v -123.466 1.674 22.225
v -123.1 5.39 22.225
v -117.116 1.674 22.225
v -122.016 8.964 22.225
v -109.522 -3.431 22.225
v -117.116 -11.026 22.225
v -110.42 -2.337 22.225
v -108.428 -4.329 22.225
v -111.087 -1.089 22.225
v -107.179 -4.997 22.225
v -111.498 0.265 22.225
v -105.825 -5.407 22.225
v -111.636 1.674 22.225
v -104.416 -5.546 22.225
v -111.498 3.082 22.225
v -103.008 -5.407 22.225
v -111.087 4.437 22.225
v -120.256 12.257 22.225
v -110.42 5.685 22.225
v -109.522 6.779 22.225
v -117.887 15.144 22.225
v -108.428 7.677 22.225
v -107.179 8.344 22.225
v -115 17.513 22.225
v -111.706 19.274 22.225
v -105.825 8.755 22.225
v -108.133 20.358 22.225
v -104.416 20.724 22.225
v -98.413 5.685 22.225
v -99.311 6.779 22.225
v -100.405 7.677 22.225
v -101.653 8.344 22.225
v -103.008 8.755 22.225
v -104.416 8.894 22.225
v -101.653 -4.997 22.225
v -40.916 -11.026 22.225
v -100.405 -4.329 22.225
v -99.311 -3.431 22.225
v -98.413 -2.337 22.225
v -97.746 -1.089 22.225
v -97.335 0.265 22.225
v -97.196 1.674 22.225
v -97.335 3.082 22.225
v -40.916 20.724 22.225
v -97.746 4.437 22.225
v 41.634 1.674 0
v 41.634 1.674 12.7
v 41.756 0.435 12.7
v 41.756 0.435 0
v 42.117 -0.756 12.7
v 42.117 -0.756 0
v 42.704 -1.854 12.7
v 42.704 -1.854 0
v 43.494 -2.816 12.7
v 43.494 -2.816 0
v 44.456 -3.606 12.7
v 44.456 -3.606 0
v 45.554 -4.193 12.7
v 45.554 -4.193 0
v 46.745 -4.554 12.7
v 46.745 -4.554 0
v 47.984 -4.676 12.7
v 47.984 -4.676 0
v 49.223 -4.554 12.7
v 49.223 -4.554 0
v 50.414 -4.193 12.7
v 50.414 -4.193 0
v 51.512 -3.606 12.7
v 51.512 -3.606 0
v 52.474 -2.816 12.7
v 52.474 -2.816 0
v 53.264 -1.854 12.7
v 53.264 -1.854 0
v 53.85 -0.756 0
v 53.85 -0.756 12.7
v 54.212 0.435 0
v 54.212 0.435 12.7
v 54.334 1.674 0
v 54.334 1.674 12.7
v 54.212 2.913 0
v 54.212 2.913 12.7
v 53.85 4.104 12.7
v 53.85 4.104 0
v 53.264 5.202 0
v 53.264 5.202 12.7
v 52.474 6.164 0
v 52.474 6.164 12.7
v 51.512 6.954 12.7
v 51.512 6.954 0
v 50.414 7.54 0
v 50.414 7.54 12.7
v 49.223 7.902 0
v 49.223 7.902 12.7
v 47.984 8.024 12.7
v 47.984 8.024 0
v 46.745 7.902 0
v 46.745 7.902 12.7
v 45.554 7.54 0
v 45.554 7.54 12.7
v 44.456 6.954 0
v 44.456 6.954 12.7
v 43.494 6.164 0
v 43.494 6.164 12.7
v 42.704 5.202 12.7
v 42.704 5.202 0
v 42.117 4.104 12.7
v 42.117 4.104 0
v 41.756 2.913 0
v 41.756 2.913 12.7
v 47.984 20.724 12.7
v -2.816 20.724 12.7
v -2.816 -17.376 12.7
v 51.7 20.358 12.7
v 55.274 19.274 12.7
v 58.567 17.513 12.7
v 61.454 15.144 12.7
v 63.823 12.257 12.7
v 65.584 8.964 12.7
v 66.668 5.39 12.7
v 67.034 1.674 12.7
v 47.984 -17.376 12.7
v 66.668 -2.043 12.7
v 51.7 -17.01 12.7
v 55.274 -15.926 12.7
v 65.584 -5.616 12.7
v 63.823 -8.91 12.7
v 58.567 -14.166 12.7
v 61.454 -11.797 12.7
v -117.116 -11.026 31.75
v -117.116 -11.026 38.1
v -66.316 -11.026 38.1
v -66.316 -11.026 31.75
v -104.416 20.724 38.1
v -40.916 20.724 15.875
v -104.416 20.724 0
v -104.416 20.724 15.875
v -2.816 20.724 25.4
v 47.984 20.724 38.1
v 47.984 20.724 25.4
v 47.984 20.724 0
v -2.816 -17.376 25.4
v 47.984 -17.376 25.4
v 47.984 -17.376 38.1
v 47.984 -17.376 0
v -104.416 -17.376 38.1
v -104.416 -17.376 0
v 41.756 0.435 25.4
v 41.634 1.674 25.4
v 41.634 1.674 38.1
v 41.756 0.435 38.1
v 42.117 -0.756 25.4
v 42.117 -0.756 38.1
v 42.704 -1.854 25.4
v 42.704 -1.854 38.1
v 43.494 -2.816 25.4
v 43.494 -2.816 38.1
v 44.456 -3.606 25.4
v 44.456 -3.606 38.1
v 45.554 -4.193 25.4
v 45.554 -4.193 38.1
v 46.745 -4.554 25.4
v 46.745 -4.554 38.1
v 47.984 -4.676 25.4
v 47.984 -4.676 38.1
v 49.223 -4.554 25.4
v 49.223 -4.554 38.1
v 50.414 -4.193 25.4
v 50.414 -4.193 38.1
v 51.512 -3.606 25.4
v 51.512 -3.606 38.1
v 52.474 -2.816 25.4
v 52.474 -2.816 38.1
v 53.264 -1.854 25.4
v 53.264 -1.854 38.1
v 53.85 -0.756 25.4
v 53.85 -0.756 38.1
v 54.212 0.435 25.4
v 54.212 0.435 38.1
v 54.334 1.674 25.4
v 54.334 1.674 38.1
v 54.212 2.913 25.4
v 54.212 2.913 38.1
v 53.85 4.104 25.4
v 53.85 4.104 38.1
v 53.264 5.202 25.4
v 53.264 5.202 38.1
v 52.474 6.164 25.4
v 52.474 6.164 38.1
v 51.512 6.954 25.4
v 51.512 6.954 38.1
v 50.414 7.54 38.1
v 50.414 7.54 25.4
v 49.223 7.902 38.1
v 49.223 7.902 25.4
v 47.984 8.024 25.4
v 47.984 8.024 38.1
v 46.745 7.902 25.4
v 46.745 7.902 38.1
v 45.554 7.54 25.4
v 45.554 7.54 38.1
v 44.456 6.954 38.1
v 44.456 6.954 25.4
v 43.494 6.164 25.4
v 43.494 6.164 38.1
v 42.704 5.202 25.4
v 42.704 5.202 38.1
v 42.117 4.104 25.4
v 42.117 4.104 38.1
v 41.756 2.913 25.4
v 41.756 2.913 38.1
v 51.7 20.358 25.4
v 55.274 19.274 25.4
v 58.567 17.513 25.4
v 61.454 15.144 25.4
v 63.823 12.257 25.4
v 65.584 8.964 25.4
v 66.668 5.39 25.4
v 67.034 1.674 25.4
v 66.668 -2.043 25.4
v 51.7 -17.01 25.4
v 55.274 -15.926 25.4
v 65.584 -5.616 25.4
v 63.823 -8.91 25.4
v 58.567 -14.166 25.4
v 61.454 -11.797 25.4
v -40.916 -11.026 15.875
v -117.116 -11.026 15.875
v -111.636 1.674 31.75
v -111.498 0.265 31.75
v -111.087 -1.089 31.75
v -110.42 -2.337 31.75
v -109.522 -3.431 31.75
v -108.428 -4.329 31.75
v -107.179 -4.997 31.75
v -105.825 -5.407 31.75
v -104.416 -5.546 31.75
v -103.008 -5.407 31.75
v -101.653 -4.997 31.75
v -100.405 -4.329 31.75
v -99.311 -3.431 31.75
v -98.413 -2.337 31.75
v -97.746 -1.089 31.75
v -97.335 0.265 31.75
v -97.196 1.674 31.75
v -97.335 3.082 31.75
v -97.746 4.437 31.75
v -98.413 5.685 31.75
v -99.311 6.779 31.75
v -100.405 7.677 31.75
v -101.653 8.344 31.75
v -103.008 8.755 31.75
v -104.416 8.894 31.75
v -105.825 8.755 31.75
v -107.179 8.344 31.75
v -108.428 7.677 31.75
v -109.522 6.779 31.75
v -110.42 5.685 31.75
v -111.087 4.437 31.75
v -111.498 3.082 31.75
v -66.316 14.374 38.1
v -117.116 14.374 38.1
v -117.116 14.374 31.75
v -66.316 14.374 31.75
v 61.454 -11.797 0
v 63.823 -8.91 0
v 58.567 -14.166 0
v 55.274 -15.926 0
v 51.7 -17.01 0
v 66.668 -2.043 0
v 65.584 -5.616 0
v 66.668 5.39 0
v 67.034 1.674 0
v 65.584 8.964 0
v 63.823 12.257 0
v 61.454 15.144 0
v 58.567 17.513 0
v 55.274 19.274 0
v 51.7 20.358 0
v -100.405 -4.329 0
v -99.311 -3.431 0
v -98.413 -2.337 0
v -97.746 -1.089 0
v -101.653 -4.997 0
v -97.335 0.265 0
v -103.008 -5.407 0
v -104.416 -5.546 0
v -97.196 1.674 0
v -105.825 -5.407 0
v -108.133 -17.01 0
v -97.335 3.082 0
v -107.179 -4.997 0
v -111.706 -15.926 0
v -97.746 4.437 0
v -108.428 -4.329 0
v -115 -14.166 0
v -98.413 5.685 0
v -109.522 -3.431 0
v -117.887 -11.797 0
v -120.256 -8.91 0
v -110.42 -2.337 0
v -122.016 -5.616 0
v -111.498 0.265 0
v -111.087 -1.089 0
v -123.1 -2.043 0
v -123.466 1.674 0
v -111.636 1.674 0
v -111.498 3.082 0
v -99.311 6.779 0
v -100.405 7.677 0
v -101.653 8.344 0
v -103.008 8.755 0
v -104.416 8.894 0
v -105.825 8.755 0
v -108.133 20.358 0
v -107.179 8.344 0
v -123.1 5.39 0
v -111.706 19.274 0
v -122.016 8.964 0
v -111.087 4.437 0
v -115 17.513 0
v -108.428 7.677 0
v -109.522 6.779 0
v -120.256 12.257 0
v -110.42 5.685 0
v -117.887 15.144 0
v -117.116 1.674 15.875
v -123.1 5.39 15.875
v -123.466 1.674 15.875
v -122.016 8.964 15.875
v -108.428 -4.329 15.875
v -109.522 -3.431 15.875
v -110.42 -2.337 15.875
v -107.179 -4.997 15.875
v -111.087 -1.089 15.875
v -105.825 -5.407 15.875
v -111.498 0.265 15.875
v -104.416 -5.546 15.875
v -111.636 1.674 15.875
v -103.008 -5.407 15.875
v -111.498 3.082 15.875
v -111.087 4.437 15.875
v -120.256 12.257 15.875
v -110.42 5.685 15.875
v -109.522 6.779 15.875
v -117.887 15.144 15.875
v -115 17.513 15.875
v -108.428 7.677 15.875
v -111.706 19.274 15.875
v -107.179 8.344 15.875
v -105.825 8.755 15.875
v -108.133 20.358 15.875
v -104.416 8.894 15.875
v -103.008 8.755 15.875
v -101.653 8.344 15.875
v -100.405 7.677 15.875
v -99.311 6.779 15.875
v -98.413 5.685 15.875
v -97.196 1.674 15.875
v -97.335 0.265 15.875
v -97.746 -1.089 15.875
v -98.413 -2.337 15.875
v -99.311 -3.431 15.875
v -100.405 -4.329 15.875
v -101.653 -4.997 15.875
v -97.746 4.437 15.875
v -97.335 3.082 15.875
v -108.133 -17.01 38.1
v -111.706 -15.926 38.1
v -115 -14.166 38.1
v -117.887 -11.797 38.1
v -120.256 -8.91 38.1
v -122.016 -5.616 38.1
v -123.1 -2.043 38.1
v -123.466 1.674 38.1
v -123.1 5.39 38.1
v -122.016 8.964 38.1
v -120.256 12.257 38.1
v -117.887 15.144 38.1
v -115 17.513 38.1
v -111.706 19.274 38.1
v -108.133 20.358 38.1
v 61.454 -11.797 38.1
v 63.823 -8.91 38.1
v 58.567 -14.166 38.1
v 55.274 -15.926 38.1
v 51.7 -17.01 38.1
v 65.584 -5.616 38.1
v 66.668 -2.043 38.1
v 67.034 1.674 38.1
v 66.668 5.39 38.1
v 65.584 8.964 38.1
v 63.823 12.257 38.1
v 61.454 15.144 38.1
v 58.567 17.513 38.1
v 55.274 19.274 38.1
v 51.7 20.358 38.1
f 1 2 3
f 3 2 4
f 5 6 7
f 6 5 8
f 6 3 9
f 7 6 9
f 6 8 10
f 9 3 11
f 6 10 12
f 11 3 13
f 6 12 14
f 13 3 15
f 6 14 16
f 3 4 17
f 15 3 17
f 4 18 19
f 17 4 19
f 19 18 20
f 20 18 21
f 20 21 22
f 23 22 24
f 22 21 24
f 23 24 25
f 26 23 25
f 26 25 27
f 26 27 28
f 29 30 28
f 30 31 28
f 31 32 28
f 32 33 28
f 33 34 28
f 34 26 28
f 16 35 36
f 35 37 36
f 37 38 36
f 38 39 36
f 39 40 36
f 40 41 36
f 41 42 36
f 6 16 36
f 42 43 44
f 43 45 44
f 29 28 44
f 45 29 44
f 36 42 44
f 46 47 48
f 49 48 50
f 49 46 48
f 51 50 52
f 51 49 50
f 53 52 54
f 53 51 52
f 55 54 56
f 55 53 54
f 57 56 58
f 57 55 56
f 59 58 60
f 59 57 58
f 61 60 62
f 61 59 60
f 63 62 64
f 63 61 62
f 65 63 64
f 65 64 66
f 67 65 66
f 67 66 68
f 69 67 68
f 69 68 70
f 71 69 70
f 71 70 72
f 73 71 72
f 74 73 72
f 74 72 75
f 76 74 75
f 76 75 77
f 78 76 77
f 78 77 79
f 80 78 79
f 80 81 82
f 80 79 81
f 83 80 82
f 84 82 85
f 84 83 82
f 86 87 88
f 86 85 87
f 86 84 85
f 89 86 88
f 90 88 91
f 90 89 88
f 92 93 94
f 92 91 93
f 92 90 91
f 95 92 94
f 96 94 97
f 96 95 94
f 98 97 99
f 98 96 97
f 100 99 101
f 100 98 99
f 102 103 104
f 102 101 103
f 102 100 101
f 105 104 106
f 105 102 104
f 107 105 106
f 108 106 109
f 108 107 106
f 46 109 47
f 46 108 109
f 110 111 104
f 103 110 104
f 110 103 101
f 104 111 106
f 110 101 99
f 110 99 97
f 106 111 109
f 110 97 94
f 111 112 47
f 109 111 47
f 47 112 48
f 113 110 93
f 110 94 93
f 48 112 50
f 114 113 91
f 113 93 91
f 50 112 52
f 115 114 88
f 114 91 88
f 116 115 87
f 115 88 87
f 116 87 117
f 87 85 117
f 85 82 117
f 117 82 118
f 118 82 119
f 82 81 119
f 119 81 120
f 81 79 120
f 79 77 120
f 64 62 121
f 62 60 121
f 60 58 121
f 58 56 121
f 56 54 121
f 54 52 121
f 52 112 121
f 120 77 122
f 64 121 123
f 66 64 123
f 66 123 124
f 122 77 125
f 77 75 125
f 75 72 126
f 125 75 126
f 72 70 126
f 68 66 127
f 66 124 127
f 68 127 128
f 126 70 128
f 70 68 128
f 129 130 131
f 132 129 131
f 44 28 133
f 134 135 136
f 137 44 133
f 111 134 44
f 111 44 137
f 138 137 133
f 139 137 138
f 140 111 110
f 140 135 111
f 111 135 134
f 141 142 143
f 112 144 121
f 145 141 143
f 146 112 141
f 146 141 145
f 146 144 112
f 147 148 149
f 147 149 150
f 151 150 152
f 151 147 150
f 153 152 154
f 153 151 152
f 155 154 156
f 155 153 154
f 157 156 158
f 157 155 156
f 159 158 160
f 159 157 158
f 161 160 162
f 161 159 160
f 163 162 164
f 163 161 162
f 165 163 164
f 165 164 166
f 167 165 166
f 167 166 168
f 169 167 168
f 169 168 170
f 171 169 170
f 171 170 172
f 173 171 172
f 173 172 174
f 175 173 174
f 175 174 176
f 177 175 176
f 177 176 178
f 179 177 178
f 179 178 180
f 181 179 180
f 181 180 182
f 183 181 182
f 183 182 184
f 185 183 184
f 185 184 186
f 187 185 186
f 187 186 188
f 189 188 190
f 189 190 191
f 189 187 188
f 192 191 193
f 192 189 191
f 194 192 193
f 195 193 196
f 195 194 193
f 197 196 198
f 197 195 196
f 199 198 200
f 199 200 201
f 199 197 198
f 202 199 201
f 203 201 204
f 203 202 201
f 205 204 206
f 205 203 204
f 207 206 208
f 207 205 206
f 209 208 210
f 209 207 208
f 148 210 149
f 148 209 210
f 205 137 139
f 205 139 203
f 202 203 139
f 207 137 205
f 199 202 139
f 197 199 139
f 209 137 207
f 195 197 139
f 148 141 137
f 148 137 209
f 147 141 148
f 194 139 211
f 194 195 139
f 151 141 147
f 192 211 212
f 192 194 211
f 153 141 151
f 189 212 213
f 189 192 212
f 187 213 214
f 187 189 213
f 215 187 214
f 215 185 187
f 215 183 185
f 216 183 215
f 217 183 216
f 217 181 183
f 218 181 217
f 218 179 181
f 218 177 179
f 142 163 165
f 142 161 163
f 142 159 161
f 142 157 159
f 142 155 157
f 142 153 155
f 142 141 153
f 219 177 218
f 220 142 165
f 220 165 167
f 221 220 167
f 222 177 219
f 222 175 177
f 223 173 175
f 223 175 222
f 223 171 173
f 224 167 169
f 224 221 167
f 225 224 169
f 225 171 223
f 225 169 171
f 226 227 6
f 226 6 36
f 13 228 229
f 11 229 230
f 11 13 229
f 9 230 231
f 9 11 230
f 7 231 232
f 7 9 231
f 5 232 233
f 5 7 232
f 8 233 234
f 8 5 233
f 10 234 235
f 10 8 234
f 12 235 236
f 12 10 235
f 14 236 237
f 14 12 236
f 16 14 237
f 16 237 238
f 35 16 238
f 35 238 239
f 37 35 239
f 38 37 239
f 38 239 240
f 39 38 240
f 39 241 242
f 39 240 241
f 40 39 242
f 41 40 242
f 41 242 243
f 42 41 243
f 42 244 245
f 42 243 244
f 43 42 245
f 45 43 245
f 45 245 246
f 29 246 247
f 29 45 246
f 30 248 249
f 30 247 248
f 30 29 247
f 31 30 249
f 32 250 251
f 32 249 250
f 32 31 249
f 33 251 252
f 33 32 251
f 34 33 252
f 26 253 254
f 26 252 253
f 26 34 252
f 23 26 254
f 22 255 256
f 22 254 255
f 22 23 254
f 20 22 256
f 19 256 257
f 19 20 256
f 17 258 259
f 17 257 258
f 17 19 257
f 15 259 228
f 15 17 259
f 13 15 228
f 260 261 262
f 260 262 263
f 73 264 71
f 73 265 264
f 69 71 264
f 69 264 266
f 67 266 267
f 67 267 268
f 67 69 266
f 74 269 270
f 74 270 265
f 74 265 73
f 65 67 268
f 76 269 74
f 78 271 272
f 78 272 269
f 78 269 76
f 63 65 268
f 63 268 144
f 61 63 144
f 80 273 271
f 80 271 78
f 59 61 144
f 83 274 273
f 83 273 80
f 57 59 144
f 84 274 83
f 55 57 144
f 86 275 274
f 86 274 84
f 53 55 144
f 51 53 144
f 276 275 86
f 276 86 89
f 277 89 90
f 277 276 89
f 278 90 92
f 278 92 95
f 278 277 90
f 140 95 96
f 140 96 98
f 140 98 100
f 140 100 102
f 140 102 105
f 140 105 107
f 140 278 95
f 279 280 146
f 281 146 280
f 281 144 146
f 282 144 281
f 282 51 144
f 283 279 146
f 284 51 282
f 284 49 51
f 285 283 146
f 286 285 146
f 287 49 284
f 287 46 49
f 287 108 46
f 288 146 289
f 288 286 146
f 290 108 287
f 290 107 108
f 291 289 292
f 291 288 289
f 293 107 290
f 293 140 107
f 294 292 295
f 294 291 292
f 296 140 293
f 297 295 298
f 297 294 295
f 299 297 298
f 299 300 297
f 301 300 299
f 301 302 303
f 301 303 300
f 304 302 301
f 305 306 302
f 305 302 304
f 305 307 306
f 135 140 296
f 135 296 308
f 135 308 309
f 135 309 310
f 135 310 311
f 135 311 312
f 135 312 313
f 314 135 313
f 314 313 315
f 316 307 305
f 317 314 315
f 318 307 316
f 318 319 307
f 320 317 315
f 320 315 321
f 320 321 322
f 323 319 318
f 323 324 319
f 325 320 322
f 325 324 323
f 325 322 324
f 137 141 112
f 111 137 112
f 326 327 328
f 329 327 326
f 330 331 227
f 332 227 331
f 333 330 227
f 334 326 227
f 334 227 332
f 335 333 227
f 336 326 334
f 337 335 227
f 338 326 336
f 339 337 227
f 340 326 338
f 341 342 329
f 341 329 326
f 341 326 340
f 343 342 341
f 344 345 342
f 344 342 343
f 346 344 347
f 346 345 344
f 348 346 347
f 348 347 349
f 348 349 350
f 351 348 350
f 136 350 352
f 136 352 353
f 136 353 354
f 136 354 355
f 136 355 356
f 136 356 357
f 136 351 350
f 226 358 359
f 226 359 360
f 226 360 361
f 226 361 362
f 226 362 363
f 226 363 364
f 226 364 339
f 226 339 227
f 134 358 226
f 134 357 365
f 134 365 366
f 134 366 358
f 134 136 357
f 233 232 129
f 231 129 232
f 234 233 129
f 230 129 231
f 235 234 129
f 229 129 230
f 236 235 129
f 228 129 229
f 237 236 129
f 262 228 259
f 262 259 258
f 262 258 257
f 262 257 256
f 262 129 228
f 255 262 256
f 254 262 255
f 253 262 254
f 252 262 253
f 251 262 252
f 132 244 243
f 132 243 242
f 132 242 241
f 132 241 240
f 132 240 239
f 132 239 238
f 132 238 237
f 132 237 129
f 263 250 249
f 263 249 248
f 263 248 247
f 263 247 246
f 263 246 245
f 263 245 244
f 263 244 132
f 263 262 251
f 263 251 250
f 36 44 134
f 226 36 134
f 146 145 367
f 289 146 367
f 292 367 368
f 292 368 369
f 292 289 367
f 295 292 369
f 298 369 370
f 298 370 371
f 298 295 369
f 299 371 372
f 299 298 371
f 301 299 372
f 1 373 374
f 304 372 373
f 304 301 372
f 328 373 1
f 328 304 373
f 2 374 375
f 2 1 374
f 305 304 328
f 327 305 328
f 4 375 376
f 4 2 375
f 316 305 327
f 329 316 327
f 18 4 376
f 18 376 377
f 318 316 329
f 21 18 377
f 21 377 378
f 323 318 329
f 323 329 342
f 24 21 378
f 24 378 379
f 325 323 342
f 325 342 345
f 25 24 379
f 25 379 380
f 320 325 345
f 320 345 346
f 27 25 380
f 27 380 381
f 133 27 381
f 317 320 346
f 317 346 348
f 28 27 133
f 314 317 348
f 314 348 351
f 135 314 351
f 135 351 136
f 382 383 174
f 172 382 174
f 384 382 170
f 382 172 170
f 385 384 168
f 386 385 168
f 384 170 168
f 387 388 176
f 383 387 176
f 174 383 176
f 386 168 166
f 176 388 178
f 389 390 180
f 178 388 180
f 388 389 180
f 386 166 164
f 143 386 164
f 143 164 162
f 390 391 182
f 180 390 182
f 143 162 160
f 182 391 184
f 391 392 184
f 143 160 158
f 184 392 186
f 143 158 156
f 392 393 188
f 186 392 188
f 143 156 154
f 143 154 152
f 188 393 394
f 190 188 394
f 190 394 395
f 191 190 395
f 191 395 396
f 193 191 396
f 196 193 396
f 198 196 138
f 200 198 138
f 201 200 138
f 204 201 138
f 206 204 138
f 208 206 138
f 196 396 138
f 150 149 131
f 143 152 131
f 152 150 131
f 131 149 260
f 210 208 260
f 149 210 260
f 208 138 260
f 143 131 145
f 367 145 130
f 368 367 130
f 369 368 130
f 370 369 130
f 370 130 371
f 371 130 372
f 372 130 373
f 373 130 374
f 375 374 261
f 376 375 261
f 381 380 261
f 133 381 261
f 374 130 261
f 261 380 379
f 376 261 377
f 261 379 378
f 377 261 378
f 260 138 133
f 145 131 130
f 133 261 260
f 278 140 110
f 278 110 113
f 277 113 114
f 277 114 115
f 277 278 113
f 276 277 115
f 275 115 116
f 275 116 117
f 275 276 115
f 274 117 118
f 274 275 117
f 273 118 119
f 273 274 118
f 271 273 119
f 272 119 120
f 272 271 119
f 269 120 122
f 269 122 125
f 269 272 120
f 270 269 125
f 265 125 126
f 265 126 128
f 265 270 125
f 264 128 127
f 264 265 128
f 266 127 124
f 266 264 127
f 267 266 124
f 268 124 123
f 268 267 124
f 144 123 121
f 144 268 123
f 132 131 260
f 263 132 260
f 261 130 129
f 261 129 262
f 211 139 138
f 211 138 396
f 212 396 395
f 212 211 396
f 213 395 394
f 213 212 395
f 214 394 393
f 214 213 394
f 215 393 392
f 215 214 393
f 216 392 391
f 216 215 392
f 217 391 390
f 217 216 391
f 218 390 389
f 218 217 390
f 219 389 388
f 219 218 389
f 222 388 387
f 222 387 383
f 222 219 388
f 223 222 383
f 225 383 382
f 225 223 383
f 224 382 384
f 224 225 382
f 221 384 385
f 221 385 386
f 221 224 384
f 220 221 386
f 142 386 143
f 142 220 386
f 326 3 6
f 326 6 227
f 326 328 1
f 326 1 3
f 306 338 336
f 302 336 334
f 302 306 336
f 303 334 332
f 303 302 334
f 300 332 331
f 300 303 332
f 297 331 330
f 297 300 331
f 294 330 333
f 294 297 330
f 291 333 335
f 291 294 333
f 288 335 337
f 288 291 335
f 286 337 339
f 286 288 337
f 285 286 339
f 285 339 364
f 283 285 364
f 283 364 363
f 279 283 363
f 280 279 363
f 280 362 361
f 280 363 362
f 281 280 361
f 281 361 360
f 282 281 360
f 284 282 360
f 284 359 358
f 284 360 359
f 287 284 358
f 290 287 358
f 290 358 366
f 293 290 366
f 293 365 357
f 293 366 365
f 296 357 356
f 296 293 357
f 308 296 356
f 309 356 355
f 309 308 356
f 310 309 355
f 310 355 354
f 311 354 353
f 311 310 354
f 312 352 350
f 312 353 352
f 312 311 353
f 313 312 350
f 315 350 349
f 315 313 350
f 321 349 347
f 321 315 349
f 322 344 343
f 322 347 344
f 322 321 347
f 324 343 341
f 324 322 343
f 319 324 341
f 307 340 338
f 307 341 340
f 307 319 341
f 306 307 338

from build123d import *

# Parameters (mm, degrees)
SKETCH1_R               = 6.35
SKETCH1_R_2             = 7.220009846
BOSS_EXTRUDE1_DEPTH     = 38.1
SKETCH2_W               = 50.8
SKETCH2_H               = 25.4
CUT_EXTRUDE1_DEPTH      = 6.35
CUT_EXTRUDE2_DEPTH      = 131.862598214
CUT_EXTRUDE2_DEPTH_BACK = 131.862598214
SKETCH5_W               = 76.2
SKETCH5_H               = 12.7
SKETCH4_W               = 76.2
SKETCH4_H               = 6.35
CUT_EXTRUDE3_DEPTH      = 31.75
SKETCH7_W               = 32.699691946
SKETCH7_H               = 6.35
CUT_EXTRUDE4_DEPTH      = 19.05


with BuildPart() as part:
    # Sketch1 → Boss-Extrude1 (new body)
    with BuildSketch(Plane.XY):
        with BuildLine():
            Line((-104.416317992, 20.723849372), (47.983682008, 20.723849372))
            ThreePointArc((47.983682008, 20.723849372), (67.033682008, 1.673849372), (47.983682008, -17.376150628))
            Line((47.983682008, -17.376150628), (-104.416317992, -17.376150628))
            ThreePointArc((-104.416317992, -17.376150628), (-123.466317992, 1.673849372), (-104.416317992, 20.723849372))
        make_face()
        with Locations(Location((47.983682008, 1.673849372, 0), (0, 0, 180))):
            Circle(SKETCH1_R, mode=Mode.SUBTRACT)
        with Locations(Location((-104.416317992, 1.673849372, 0), (0, 0, 180))):
            Circle(SKETCH1_R_2, mode=Mode.SUBTRACT)
    extrude(amount=BOSS_EXTRUDE1_DEPTH)

    # Sketch2 → Cut-Extrude1 (cut)
    with BuildSketch(Plane.XY.offset(38.1)):
        with Locations((-91.716317992, 1.673849372)):
            Rectangle(SKETCH2_W, SKETCH2_H)
    extrude(amount=-CUT_EXTRUDE1_DEPTH, mode=Mode.SUBTRACT)

    # Sketch5 → Cut-Extrude2 (cut, two sides: drawn at the far end of the back side and taken through both)
    with BuildSketch(Plane(origin=(0, 0, 0), x_dir=(1, 0, 0), z_dir=(0, 1, 0)).offset(-CUT_EXTRUDE2_DEPTH_BACK)):
        with Locations((35.283682008, -19.05)):
            Rectangle(SKETCH5_W, SKETCH5_H)
    extrude(amount=CUT_EXTRUDE2_DEPTH + CUT_EXTRUDE2_DEPTH_BACK, mode=Mode.SUBTRACT)

    # Sketch4 → Cut-Extrude3 (cut)
    with BuildSketch(Plane(origin=(0, 20.723849372, 0), x_dir=(1, 0, 0), z_dir=(0, 1, 0))):
        with Locations((-79.016317992, -19.05)):
            Rectangle(SKETCH4_W, SKETCH4_H)
    extrude(amount=-CUT_EXTRUDE3_DEPTH, mode=Mode.SUBTRACT)

    # Sketch7 → Cut-Extrude4 (cut)
    with BuildSketch(Plane(origin=(0, 20.723849372, 0), x_dir=(1, 0, 0), z_dir=(0, 1, 0))):
        with Locations((-118.381657109, -19.05)):
            Rectangle(SKETCH7_W, SKETCH7_H)
    extrude(amount=-CUT_EXTRUDE4_DEPTH, mode=Mode.SUBTRACT)


solid = part.part
